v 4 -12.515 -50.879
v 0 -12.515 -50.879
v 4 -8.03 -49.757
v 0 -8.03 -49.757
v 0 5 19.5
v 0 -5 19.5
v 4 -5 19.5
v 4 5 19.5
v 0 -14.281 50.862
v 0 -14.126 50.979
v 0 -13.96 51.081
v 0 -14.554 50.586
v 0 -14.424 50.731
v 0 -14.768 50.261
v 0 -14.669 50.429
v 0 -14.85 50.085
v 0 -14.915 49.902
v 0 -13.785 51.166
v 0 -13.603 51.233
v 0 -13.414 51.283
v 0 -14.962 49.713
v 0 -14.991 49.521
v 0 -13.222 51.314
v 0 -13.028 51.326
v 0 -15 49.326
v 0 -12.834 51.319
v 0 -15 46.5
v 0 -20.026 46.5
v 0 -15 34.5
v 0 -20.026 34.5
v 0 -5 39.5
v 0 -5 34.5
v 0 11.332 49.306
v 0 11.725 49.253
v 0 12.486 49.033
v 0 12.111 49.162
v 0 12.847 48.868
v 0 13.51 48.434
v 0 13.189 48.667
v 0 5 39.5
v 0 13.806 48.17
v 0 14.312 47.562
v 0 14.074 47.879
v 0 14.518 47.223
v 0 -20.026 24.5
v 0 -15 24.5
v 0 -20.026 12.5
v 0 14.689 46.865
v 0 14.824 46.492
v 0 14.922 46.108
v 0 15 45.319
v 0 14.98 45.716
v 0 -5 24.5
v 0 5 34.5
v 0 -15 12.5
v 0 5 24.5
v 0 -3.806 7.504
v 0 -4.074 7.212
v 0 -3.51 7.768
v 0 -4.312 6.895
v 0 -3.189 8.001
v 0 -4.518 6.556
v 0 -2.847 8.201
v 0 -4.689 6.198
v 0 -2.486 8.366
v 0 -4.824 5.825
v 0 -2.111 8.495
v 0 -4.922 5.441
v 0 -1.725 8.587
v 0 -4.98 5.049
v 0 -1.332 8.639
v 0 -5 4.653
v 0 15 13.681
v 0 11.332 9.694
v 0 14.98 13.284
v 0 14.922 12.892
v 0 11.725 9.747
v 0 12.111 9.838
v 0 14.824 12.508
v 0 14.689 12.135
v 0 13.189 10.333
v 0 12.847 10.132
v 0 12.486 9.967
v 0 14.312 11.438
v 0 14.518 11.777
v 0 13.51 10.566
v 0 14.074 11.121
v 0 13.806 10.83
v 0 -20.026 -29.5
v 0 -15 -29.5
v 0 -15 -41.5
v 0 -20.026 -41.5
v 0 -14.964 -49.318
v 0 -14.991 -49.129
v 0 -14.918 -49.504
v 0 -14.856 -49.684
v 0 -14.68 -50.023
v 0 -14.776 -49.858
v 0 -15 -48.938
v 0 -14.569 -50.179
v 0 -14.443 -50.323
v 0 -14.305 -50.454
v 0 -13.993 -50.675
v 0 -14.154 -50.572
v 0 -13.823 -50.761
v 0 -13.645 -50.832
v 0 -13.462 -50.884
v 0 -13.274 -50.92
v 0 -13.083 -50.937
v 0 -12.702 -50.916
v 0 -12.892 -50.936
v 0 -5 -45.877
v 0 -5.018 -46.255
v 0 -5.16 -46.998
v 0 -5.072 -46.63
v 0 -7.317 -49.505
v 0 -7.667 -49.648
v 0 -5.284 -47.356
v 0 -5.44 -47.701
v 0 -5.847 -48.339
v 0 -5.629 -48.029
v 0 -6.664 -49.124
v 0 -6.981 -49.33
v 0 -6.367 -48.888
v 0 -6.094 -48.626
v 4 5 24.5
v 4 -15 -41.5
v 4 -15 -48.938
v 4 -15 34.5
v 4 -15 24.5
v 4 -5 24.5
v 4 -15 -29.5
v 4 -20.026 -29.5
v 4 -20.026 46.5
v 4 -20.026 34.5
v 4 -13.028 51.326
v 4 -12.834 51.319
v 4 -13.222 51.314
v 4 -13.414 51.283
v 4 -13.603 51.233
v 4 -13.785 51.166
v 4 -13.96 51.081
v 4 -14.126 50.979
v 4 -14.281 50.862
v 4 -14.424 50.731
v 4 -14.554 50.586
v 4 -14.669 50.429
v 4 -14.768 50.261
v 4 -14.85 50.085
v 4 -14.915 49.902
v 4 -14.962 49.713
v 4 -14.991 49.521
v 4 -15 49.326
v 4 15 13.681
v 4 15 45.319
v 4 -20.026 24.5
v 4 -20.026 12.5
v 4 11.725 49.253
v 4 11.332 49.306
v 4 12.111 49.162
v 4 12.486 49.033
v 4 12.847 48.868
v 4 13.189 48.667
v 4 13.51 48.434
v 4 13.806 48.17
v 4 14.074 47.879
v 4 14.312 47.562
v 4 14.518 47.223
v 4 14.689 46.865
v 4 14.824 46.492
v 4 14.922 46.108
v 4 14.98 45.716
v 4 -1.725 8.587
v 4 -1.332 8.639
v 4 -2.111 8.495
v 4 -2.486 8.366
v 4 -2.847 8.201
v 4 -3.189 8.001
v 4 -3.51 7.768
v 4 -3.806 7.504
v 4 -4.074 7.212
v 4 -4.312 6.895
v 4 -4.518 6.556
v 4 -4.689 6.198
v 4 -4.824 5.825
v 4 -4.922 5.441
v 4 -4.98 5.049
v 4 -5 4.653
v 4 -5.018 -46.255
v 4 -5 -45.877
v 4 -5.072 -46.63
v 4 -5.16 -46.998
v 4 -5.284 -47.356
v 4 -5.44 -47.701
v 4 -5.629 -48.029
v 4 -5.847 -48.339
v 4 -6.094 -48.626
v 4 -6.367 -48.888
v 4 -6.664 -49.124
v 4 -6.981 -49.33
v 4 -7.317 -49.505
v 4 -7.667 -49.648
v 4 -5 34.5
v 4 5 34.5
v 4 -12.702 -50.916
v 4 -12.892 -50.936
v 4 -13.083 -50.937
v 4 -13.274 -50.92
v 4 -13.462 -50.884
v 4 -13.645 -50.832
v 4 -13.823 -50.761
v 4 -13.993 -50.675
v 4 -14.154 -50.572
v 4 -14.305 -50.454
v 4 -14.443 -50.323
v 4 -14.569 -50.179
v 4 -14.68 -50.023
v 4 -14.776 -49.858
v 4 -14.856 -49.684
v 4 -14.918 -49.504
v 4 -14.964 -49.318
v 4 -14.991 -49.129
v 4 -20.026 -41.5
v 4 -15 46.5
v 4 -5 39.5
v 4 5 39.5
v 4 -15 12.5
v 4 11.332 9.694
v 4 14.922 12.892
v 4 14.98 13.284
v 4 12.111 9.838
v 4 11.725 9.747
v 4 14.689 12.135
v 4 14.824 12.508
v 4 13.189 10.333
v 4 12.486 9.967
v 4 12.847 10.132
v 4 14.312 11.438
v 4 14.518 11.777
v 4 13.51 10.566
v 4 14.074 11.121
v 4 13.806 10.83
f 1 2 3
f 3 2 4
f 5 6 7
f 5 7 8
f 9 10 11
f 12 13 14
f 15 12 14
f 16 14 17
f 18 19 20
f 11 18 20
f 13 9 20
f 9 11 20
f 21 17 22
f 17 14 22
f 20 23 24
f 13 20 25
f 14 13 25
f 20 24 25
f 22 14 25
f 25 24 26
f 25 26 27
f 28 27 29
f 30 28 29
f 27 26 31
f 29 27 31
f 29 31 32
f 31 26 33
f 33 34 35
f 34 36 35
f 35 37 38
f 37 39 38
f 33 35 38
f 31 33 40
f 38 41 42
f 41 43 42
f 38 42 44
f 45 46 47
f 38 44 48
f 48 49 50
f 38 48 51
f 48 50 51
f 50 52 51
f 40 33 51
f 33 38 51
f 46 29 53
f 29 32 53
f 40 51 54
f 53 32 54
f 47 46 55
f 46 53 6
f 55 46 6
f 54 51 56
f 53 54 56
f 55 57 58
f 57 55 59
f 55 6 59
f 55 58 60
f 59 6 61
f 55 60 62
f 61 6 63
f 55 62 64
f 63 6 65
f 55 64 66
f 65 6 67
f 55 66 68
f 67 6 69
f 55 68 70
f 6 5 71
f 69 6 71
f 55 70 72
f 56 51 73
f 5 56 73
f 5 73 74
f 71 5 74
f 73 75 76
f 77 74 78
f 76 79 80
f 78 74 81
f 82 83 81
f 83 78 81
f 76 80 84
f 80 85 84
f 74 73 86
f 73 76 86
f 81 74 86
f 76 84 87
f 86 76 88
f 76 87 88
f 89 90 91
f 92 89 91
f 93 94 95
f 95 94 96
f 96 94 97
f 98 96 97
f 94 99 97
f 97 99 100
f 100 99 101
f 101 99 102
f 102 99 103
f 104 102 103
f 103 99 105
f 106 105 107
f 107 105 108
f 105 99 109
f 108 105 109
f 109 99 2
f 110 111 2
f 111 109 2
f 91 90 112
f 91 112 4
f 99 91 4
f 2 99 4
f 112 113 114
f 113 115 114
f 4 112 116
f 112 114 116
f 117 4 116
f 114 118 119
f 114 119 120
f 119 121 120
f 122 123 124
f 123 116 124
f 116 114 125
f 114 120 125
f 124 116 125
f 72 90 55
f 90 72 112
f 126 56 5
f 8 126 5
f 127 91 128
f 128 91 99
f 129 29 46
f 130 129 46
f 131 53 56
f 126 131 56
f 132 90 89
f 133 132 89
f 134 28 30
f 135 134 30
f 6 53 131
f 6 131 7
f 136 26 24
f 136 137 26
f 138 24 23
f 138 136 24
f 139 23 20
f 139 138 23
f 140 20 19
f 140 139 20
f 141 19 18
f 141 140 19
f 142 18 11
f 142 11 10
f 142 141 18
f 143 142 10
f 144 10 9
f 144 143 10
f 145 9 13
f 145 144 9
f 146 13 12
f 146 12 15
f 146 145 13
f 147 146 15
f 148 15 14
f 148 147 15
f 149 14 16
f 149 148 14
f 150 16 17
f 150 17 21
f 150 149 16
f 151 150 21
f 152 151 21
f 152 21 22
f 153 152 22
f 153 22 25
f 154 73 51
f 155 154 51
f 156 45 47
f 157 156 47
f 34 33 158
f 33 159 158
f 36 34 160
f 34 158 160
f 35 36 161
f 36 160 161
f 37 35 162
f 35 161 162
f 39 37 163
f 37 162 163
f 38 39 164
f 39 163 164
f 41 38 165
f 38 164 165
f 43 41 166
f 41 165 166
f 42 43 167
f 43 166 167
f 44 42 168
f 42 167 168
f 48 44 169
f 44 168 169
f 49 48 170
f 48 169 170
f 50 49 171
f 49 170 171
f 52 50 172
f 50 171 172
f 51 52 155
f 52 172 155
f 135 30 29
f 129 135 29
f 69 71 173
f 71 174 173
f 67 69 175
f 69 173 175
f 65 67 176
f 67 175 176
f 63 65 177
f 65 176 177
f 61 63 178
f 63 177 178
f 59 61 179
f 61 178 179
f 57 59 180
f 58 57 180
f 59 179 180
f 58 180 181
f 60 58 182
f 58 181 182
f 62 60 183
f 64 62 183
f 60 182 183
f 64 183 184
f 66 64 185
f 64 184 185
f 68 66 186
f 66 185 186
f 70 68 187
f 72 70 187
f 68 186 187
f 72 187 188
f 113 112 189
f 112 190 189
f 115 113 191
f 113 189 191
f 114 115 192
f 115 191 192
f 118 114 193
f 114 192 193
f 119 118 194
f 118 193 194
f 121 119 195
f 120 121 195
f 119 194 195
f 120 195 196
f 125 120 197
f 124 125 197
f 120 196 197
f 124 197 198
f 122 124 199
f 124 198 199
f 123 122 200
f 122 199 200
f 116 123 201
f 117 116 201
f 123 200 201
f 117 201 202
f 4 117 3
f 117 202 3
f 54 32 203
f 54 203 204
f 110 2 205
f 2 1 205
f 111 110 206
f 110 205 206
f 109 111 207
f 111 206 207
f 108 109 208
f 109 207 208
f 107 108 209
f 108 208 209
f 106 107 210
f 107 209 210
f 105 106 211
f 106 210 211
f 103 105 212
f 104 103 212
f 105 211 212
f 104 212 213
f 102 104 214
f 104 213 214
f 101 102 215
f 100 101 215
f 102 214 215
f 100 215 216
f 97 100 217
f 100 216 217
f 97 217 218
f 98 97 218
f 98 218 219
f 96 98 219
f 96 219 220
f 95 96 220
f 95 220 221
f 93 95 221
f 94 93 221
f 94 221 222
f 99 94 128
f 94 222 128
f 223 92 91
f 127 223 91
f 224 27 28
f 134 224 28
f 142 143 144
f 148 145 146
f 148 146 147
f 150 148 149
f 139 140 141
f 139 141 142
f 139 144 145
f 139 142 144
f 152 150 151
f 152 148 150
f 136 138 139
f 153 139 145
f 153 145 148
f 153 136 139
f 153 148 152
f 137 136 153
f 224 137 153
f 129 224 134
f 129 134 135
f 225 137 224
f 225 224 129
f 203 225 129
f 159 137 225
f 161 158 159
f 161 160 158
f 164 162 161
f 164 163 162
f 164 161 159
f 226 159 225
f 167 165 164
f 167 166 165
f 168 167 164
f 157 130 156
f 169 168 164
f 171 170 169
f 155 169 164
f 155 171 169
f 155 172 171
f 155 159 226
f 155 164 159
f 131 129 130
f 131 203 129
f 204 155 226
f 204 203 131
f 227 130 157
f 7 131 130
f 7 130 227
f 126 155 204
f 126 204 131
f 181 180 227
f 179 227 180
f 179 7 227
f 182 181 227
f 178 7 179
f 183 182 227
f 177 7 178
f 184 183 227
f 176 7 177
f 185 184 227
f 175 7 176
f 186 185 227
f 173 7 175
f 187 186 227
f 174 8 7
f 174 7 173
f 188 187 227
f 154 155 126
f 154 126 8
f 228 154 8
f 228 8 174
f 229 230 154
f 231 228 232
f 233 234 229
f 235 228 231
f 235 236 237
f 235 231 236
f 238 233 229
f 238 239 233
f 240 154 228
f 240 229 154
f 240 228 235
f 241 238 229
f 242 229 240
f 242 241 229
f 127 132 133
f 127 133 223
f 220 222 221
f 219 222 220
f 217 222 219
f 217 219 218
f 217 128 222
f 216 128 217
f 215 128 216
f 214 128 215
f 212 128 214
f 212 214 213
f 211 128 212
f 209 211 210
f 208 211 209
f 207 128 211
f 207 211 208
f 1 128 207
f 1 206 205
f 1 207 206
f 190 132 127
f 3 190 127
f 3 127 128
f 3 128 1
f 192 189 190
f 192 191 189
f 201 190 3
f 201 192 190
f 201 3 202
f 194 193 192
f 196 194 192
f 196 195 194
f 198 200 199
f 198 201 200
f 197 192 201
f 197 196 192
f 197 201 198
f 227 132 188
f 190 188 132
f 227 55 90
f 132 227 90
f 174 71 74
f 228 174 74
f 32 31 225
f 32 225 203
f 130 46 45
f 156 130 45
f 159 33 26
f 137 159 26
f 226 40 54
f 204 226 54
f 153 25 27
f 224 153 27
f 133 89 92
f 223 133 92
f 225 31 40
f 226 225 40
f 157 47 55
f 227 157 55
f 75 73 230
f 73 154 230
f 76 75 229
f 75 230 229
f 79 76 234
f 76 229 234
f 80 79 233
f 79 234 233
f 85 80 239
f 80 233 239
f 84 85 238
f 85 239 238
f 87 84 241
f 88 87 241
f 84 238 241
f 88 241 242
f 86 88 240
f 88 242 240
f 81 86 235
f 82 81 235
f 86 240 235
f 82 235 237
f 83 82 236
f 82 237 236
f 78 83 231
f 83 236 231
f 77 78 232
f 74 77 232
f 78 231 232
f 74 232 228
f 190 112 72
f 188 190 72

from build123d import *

# Parameters (mm, degrees)
SKETCH1_W           = 5
SKETCH1_H           = 10
BOSS_EXTRUDE1_DEPTH = 4
FILLET2_R           = 4
FILLET4_R           = 2


with BuildPart() as part:
    # Sketch1 → Boss-Extrude1 (new body)
    with BuildSketch(Plane(origin=(0, 0, 0), x_dir=(0, 0, -1), z_dir=(1, 0, 0))):
        Polygon((-46.5, -15), (-46.5, -20.025618734), (-34.5, -20.025618734), (-34.5, -15), (-24.5, -15), (-24.5, -20.025618734), (-12.5, -20.025618734), (-12.5, -15), (29.5, -15), (29.5, -20.025618734), (41.5, -20.025618734), (41.5, -15), (51.5, -15), (49, -5), (-8.333333333, -5), (-10, 15), (-49, 15), (-51.5, -15), align=None)
        with Locations((-22, 0)):
            Rectangle(SKETCH1_W, SKETCH1_H, mode=Mode.SUBTRACT)
        with Locations((-37, 0)):
            Rectangle(SKETCH1_W, SKETCH1_H, mode=Mode.SUBTRACT)
    extrude(amount=BOSS_EXTRUDE1_DEPTH)

    # Fillet2
    fillet2_edges = [part.edges().sort_by_distance(p)[0] for p in [
        (2, 15, 49),
        (2, 15, 10),
        (2, -5, 8.333333333),
        (2, -5, -49),
    ]]
    fillet(fillet2_edges, radius=FILLET2_R)

    # Fillet4
    fillet4_edges = [part.edges().sort_by_distance(p)[0] for p in [
        (2, -15, 51.5),
        (2, -15, -51.5),
    ]]
    fillet(fillet4_edges, radius=FILLET4_R)


solid = part.part
